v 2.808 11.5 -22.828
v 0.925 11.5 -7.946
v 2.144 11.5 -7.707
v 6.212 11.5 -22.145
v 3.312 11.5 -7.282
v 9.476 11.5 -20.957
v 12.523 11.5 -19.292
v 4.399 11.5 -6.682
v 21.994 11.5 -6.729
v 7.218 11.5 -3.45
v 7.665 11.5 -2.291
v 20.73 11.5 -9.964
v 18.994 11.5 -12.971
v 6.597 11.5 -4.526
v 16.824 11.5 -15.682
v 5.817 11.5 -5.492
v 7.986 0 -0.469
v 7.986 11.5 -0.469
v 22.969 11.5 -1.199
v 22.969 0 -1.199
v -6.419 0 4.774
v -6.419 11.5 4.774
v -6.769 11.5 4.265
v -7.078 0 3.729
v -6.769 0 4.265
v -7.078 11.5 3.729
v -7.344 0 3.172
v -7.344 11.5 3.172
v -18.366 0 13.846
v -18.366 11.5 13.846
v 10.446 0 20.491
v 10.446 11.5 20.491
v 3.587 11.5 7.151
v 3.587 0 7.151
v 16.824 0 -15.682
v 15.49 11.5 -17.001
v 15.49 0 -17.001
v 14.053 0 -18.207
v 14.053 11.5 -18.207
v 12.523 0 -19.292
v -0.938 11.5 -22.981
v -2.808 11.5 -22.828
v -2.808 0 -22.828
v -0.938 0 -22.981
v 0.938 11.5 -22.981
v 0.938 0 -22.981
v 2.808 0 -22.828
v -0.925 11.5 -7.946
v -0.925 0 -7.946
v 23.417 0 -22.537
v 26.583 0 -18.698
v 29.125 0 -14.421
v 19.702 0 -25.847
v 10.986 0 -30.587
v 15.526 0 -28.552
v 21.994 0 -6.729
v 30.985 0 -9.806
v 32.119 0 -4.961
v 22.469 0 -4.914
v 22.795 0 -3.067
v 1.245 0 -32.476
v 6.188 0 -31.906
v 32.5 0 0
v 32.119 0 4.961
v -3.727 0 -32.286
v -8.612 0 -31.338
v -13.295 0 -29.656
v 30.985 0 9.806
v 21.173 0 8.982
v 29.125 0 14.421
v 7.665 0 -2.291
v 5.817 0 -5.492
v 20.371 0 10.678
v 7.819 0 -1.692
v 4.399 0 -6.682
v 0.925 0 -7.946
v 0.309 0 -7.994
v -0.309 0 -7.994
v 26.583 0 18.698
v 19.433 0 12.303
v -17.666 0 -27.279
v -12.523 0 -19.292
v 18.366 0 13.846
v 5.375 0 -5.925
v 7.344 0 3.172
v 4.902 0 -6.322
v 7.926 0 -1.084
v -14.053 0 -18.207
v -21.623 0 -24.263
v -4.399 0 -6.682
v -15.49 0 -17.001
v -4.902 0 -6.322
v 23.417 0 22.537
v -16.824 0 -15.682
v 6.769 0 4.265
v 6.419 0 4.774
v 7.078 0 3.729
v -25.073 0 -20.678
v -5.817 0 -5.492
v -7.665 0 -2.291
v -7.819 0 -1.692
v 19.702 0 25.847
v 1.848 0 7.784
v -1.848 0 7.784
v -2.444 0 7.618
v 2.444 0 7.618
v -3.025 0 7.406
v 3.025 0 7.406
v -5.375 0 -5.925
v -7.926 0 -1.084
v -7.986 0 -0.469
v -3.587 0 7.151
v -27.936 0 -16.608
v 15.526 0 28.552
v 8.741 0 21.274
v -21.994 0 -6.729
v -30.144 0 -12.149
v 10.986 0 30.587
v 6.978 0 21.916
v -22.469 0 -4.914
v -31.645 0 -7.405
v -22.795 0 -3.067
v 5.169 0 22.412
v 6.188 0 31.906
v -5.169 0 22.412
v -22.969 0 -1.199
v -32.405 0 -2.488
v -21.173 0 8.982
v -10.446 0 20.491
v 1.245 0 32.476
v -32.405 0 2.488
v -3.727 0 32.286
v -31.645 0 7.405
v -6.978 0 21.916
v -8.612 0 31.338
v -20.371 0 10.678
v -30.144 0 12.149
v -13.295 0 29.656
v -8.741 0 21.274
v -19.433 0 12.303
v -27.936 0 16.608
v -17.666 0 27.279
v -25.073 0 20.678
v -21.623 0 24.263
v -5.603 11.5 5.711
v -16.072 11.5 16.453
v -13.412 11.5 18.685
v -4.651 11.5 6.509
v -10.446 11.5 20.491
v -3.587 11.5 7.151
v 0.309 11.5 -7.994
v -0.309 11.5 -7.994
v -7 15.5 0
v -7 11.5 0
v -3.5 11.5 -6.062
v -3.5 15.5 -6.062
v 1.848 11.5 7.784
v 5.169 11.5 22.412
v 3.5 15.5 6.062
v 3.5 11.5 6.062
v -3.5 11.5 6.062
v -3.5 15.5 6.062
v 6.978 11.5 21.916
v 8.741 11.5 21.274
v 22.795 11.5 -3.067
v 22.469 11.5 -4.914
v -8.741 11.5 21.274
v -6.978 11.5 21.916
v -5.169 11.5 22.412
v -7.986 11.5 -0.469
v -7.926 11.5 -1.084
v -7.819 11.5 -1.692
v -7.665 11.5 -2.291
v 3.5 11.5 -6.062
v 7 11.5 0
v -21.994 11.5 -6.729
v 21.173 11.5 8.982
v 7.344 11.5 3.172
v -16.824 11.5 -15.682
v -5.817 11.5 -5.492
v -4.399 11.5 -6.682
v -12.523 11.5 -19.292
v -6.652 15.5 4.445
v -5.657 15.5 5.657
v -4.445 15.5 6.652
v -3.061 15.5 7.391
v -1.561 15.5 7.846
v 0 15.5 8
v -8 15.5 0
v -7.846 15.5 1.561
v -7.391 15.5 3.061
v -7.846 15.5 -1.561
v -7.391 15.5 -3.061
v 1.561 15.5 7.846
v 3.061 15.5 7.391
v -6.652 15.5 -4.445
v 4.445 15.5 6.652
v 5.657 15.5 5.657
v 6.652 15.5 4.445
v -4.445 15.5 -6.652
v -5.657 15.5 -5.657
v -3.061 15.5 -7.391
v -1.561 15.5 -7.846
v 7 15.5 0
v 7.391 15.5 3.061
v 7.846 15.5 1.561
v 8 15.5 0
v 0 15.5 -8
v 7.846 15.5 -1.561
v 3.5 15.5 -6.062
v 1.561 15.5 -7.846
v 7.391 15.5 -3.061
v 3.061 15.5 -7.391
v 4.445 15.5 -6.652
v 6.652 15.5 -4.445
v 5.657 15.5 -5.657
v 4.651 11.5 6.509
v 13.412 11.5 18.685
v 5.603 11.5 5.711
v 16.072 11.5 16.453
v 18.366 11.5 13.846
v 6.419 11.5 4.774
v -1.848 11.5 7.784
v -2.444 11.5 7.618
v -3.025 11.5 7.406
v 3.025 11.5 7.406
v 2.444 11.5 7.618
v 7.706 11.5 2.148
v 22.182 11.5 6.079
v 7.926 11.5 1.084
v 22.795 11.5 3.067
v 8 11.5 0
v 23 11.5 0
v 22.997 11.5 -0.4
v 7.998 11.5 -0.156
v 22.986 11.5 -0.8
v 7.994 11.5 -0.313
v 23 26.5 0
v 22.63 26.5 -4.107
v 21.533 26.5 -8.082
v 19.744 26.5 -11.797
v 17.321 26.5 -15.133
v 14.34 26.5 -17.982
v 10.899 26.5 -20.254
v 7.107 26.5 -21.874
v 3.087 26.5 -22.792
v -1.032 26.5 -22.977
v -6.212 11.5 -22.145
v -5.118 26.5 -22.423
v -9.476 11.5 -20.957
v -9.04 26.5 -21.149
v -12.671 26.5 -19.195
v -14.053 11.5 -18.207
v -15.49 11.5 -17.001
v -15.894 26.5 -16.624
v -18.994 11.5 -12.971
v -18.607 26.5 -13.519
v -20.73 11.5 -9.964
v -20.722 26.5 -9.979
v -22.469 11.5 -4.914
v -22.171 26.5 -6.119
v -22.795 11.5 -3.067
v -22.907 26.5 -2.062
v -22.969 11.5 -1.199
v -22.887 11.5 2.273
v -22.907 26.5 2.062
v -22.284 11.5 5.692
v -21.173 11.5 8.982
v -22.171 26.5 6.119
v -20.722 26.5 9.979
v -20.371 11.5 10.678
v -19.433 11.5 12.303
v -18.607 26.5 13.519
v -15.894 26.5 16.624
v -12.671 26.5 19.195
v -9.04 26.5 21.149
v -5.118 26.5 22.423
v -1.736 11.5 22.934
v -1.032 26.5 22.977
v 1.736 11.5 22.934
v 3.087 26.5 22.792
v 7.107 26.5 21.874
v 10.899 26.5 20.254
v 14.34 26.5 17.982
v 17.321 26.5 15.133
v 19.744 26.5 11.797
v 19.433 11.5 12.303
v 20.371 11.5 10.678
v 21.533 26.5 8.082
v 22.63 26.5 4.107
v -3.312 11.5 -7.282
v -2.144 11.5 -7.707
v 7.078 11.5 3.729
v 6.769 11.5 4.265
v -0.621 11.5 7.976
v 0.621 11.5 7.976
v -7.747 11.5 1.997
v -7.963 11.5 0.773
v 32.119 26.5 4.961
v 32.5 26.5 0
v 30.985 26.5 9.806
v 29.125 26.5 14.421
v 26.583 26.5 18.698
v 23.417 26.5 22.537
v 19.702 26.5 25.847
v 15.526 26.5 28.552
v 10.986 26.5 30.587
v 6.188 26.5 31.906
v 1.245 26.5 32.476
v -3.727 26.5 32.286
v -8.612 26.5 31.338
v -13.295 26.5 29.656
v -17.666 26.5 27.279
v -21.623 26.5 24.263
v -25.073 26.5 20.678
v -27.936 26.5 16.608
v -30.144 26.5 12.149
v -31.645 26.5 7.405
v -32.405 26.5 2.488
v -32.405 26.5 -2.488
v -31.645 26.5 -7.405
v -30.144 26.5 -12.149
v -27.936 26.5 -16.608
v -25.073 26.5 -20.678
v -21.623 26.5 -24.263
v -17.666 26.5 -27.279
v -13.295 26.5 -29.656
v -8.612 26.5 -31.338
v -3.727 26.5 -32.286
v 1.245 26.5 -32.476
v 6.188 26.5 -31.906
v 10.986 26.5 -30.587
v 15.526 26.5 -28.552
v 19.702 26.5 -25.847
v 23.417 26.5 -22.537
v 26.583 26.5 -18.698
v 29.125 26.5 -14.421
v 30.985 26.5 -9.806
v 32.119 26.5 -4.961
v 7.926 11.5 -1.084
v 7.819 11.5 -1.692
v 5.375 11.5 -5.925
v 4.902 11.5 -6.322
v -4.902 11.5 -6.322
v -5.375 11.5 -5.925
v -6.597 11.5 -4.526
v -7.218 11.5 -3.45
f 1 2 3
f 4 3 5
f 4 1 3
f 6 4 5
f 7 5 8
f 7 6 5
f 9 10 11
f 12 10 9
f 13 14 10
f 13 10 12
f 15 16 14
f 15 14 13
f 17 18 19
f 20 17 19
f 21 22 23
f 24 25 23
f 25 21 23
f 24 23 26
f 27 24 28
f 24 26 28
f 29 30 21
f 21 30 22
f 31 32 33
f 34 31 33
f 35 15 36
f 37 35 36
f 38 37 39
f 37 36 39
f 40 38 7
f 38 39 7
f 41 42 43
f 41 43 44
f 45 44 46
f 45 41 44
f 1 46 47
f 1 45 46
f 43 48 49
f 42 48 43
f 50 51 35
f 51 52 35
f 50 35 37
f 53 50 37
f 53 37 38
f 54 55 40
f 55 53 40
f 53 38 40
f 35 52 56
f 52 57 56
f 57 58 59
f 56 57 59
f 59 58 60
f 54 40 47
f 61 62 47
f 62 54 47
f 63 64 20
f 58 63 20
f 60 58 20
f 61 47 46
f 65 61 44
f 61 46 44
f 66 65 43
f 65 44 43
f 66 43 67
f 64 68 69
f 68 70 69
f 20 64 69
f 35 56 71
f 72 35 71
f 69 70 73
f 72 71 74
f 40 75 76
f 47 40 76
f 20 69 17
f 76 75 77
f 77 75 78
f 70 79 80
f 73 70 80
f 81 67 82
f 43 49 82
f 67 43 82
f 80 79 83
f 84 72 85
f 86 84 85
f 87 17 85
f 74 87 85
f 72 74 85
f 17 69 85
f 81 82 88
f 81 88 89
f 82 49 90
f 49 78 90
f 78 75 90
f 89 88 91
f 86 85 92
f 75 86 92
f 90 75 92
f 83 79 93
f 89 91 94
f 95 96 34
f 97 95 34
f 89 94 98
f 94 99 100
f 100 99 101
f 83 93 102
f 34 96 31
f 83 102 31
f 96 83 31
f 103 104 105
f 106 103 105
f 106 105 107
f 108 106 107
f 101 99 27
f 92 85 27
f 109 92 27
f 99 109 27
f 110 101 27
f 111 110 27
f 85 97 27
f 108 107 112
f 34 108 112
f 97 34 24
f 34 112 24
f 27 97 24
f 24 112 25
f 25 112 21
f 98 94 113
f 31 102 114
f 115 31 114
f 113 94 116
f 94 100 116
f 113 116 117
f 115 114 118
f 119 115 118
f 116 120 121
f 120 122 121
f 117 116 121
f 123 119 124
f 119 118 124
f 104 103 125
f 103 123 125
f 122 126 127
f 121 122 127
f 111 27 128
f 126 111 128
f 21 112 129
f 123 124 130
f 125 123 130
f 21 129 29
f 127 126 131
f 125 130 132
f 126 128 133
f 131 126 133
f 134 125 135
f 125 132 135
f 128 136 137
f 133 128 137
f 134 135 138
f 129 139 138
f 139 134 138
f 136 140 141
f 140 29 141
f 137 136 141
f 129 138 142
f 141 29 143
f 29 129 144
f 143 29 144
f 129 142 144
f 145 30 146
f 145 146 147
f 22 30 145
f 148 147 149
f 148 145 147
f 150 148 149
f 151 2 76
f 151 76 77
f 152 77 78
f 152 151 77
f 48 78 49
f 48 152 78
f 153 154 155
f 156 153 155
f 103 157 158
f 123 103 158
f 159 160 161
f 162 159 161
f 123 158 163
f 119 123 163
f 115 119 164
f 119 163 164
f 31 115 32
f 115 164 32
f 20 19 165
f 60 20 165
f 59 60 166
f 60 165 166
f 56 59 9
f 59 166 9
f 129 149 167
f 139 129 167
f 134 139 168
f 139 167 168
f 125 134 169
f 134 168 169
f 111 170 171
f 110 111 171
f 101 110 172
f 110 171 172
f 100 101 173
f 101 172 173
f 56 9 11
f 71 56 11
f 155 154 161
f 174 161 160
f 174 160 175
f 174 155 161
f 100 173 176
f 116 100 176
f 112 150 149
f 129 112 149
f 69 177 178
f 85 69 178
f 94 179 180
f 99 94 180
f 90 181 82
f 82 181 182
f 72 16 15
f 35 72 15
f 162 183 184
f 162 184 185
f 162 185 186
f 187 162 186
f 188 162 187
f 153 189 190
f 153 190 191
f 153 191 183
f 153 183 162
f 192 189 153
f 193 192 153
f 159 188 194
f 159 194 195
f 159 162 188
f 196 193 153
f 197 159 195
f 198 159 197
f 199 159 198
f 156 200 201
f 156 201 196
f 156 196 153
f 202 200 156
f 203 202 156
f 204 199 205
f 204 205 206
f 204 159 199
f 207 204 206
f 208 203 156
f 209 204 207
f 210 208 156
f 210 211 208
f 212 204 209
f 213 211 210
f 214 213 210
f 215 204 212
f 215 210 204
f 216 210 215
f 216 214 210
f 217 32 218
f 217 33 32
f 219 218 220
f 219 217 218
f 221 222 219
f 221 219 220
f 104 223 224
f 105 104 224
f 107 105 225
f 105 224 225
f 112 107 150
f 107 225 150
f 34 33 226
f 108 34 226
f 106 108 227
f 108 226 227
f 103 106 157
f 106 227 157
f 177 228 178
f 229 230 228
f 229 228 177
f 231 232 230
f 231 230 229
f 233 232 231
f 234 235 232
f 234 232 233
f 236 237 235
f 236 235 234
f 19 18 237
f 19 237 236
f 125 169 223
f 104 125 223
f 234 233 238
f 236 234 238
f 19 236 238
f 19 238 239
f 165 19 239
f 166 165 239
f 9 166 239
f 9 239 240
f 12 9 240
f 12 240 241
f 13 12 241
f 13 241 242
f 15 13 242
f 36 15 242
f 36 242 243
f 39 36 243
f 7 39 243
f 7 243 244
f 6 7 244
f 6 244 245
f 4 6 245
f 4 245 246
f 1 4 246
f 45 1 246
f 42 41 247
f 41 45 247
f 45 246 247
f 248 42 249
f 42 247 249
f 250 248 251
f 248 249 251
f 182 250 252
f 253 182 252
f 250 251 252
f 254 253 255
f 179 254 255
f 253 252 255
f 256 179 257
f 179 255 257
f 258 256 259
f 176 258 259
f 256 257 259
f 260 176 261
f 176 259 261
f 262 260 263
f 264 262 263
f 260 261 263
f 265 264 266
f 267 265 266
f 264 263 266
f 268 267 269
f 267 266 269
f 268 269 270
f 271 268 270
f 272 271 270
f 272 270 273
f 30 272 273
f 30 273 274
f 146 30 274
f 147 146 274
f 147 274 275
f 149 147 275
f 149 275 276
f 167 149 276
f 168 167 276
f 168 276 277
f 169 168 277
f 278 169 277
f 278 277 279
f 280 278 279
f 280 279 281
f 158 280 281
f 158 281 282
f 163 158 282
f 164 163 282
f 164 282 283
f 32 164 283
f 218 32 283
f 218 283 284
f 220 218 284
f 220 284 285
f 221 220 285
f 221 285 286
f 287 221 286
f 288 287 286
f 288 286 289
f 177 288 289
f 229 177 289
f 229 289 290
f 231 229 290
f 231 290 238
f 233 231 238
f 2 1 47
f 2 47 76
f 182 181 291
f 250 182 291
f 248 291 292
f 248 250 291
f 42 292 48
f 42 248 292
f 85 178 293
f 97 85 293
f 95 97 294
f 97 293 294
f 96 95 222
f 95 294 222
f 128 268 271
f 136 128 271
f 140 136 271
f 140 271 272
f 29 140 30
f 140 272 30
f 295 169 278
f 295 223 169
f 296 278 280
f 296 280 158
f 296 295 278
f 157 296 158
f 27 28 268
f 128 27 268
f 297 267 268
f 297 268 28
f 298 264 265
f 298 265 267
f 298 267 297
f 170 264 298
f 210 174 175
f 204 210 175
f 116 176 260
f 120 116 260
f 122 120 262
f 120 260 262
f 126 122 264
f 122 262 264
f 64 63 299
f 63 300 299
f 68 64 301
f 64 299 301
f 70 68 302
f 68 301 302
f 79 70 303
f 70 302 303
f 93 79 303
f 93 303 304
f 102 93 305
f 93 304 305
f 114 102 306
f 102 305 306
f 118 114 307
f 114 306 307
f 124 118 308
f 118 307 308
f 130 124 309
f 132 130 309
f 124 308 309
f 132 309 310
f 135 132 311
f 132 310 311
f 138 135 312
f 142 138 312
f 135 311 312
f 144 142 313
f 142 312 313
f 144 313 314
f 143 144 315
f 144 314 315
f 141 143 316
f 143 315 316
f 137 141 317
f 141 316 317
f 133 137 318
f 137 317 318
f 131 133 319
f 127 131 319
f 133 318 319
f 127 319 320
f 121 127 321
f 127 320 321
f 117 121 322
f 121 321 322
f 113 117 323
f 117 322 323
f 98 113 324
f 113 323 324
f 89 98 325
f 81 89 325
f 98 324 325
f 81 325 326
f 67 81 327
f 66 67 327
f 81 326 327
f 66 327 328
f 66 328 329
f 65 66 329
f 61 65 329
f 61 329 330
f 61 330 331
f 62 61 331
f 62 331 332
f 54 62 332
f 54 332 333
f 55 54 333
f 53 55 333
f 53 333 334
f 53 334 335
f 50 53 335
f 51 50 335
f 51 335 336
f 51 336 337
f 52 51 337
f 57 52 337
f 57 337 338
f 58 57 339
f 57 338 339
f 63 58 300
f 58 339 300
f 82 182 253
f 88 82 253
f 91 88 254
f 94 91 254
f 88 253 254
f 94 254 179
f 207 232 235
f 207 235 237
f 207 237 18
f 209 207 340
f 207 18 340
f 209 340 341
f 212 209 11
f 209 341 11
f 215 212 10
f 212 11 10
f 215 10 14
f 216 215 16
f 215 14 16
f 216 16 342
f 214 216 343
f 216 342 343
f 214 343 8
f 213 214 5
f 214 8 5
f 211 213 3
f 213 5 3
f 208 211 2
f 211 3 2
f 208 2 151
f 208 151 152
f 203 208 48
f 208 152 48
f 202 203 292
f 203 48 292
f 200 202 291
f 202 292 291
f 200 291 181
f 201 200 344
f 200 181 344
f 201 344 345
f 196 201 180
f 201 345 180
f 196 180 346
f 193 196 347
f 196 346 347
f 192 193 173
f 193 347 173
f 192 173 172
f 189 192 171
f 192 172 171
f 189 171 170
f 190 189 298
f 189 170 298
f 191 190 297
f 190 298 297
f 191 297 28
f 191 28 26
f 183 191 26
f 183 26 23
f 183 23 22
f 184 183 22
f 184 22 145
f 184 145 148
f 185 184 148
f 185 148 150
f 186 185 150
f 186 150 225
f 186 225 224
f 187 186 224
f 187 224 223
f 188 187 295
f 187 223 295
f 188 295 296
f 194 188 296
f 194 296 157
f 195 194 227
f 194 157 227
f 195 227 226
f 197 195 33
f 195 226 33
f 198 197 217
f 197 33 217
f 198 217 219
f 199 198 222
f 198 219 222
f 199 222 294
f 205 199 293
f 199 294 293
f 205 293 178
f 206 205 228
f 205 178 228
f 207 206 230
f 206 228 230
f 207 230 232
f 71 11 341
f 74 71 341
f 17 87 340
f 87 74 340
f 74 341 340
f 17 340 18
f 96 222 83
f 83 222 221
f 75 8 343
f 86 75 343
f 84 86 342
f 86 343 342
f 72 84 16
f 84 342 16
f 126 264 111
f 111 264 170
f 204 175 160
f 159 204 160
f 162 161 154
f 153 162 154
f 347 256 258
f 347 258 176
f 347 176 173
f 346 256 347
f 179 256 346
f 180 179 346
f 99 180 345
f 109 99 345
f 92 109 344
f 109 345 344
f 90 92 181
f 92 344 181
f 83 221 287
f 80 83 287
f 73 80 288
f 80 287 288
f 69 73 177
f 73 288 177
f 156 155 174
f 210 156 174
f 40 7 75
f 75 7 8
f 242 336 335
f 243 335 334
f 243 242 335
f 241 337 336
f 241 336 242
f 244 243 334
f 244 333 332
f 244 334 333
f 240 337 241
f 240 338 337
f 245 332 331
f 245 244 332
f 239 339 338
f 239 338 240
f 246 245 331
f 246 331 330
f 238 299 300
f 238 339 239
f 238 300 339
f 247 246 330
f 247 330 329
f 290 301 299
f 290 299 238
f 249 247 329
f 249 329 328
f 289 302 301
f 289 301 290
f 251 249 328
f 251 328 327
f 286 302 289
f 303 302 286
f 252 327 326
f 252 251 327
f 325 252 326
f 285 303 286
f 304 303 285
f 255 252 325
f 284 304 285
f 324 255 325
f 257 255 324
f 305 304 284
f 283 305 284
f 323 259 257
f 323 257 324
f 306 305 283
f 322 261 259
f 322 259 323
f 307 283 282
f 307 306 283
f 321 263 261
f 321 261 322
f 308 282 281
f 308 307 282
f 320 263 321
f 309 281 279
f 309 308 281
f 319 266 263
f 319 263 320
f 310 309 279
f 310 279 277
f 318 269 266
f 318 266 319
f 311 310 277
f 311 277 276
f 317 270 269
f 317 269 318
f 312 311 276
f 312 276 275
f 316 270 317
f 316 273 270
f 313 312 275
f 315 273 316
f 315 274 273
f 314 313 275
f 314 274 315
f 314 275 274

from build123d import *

# Parameters (mm, degrees)
SKETCH_1_W          = 32.5
SKETCH_1_H          = 26.5
SKETCH_2_R          = 23
CUT_EXTRUDE_1_DEPTH = 15
SKETCH_3_R          = 8
EXTRUDE_1_DEPTH     = 4
CUT_EXTRUDE_2_DEPTH = 12.5


with BuildPart() as part:
    # 草图1 → 旋转1 (revolve)
    with BuildSketch(Plane.XY):
        with Locations((16.25, 13.25)):
            Rectangle(SKETCH_1_W, SKETCH_1_H)
    revolve(axis=Axis((0, 54.381188119, 0), (0, -1, 0)))

    # 草图2 → 切除-拉伸1 (cut)
    with BuildSketch(Plane(origin=(0, 26.5, 0), x_dir=(1, 0, 0), z_dir=(0, 1, 0))):
        Circle(SKETCH_2_R)
    extrude(amount=-CUT_EXTRUDE_1_DEPTH, mode=Mode.SUBTRACT)

    # 草图3 → 凸台-拉伸1 (add)
    with BuildSketch(Plane(origin=(0, 11.5, 0), x_dir=(1, 0, 0), z_dir=(0, 1, 0))):
        Circle(SKETCH_3_R)
        Polygon((-3.5, 6.062177826), (3.5, 6.062177826), (7, 0), (3.5, -6.062177826), (-3.5, -6.062177826), (-7, 0), align=None, mode=Mode.SUBTRACT)
    extrude(amount=EXTRUDE_1_DEPTH)

    # 草图4 → 切除-拉伸2 (cut, through all)
    with BuildSketch(Plane(origin=(0, 11.5, 0), x_dir=(1, 0, 0), z_dir=(0, 1, 0))):
        with BuildLine():
            Line((-0.925251662, 7.9463142), (-2.807719573, 22.827980874))
            ThreePointArc((-2.807719573, 22.827980874), (0, 23), (2.807719573, 22.827980874))
            Line((2.807719573, 22.827980874), (0.925251662, 7.9463142))
            ThreePointArc((0.925251662, 7.9463142), (0, 8), (-0.925251662, 7.9463142))
        make_face()
        with BuildLine():
            Line((5.816576204, 5.492489532), (16.824381237, 15.682480544))
            ThreePointArc((16.824381237, 15.682480544), (14.784115023, 17.619022192), (12.522705284, 19.292015249))
            Line((12.522705284, 19.292015249), (4.399008416, 6.68197014))
            ThreePointArc((4.399008416, 6.68197014), (5.142300877, 6.128355545), (5.816576204, 5.492489532))
        make_face()
        with BuildLine():
            Line((7.986260097, 0.46866797), (22.968727938, 1.198973275))
            ThreePointArc((22.968727938, 1.198973275), (22.650578319, 3.993908086), (21.993617163, 6.729101282))
            Line((21.993617163, 6.729101282), (7.664923567, 2.29105799))
            ThreePointArc((7.664923567, 2.29105799), (7.878462024, 1.389185421), (7.986260097, 0.46866797))
        make_face()
        with BuildLine():
            Line((6.419084133, -4.774448544), (18.365751568, -13.845546914))
            ThreePointArc((18.365751568, -13.845546914), (19.918584287, -11.5), (21.173471141, -8.98243396))
            Line((21.173471141, -8.98243396), (7.344335794, -3.171865656))
            ThreePointArc((7.344335794, -3.171865656), (6.92820323, -4), (6.419084133, -4.774448544))
        make_face()
        with BuildLine():
            Line((1.848347363, -7.783547522), (5.169235927, -22.411581826))
            ThreePointArc((5.169235927, -22.411581826), (7.866463296, -21.612930278), (10.446022654, -20.490988524))
            Line((10.446022654, -20.490988524), (3.58725168, -7.15063811))
            ThreePointArc((3.58725168, -7.15063811), (2.736161147, -7.517540966), (1.848347363, -7.783547522))
        make_face()
        with BuildLine():
            Line((-3.58725168, -7.15063811), (-10.446022654, -20.490988524))
            ThreePointArc((-10.446022654, -20.490988524), (-7.866463296, -21.612930278), (-5.169235927, -22.411581826))
            Line((-5.169235927, -22.411581826), (-1.848347363, -7.783547522))
            ThreePointArc((-1.848347363, -7.783547522), (-2.736161147, -7.517540966), (-3.58725168, -7.15063811))
        make_face()
        with BuildLine():
            Line((-7.344335794, -3.171865656), (-21.173471141, -8.98243396))
            ThreePointArc((-21.173471141, -8.98243396), (-19.918584287, -11.5), (-18.365751568, -13.845546914))
            Line((-18.365751568, -13.845546914), (-6.419084133, -4.774448544))
            ThreePointArc((-6.419084133, -4.774448544), (-6.92820323, -4), (-7.344335794, -3.171865656))
        make_face()
        with BuildLine():
            Line((-7.664923567, 2.29105799), (-21.993617163, 6.729101282))
            ThreePointArc((-21.993617163, 6.729101282), (-22.650578319, 3.993908086), (-22.968727938, 1.198973275))
            Line((-22.968727938, 1.198973275), (-7.986260097, 0.46866797))
            ThreePointArc((-7.986260097, 0.46866797), (-7.878462024, 1.389185421), (-7.664923567, 2.29105799))
        make_face()
        with BuildLine():
            Line((-4.399008416, 6.68197014), (-12.522705284, 19.292015249))
            ThreePointArc((-12.522705284, 19.292015249), (-14.784115023, 17.619022192), (-16.824381237, 15.682480544))
            Line((-16.824381237, 15.682480544), (-5.816576204, 5.492489532))
            ThreePointArc((-5.816576204, 5.492489532), (-5.142300877, 6.128355545), (-4.399008416, 6.68197014))
        make_face()
    extrude(amount=-CUT_EXTRUDE_2_DEPTH, mode=Mode.SUBTRACT)


solid = part.part
